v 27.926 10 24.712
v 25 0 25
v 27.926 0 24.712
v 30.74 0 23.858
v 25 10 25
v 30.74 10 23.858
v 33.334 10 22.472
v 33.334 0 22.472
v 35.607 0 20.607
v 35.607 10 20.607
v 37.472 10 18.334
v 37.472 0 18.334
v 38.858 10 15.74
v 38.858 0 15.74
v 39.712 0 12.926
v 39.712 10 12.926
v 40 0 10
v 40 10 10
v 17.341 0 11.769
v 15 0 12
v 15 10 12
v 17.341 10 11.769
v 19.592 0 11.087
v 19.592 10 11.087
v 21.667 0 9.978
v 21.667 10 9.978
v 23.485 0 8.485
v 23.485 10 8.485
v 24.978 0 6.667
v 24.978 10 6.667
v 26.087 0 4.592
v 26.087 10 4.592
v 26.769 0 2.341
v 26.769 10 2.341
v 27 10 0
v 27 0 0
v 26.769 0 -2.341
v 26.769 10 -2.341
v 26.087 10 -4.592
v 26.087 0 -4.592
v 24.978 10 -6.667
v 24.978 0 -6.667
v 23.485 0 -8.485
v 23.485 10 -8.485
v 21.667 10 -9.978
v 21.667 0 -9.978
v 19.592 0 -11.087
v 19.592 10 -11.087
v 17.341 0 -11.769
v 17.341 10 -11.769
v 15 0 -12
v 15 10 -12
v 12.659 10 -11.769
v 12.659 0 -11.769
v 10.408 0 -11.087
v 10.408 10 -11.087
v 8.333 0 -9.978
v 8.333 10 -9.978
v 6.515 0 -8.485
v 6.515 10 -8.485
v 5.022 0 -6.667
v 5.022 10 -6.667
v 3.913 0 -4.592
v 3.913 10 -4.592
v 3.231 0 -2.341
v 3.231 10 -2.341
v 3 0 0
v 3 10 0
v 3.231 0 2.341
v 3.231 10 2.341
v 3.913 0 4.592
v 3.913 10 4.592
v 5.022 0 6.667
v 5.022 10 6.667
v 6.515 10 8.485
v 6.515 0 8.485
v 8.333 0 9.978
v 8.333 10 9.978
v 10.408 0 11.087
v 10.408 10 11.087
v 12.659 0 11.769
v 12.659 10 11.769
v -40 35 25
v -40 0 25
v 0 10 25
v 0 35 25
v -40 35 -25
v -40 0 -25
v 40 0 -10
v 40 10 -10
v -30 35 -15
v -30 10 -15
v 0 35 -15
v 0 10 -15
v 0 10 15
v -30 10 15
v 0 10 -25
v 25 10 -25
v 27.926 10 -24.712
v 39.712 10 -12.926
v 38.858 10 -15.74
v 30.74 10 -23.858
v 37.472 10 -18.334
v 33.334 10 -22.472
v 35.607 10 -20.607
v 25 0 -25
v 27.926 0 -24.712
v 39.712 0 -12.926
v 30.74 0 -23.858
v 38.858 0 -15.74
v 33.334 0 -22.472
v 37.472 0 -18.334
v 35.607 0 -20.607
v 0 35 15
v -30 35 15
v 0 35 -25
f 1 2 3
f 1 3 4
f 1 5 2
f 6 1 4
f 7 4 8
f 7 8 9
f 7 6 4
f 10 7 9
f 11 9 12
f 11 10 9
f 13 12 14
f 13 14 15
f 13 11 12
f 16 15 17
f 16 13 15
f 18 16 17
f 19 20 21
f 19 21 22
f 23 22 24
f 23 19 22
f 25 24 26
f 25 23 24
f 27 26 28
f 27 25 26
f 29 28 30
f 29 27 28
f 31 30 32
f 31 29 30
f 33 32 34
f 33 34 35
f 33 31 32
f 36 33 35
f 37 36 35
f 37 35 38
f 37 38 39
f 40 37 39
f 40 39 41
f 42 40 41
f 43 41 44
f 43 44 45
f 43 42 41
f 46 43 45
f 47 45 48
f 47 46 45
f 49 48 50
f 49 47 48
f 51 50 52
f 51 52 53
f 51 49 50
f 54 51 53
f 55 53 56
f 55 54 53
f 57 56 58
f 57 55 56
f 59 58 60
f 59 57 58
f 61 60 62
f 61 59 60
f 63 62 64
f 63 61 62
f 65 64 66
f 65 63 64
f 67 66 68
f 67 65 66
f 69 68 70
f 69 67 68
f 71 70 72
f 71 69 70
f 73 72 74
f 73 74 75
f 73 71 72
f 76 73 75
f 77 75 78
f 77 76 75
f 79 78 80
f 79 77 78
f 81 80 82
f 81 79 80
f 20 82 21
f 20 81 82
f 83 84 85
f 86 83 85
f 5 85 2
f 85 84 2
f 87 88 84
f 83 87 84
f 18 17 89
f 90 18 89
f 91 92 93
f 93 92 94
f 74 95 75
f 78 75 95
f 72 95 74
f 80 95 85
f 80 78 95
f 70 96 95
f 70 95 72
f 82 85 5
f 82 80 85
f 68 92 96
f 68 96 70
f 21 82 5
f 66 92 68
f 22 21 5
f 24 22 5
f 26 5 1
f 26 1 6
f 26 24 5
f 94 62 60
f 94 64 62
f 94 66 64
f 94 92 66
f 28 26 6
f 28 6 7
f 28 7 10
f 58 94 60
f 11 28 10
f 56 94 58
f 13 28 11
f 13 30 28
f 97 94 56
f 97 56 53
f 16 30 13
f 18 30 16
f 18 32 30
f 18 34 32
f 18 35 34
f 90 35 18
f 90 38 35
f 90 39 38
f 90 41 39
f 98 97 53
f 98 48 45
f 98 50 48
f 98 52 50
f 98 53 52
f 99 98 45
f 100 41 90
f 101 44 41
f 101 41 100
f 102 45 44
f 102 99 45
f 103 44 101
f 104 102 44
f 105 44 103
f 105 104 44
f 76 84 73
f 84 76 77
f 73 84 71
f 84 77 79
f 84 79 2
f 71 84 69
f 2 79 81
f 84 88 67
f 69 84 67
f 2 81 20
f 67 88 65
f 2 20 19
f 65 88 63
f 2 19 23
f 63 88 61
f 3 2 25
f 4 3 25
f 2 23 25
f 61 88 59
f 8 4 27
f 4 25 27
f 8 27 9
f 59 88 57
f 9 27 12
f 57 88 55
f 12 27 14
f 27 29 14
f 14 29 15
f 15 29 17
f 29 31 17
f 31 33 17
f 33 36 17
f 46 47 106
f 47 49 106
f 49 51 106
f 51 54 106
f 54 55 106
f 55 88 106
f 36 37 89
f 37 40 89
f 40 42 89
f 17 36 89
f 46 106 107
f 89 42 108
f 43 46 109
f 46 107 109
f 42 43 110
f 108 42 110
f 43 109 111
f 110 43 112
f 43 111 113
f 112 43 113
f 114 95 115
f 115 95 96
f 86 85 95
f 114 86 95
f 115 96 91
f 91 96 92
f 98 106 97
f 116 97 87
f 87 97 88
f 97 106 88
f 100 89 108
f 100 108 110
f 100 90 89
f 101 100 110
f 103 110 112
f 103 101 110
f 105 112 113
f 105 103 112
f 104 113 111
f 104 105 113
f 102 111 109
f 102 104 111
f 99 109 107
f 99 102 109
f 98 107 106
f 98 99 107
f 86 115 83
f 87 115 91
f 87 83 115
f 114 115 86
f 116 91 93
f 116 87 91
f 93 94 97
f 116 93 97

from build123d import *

# Parameters (mm, degrees)
SKETCH1_R           = 12
BOSS_EXTRUDE1_DEPTH = 10
BOSS_EXTRUDE2_DEPTH = 35
FILLET1_R           = 15


with BuildPart() as part:
    # Sketch1 → Boss-Extrude1 (new body)
    with BuildSketch(Plane(origin=(0, 0, 0), x_dir=(1, 0, 0), z_dir=(0, 1, 0))):
        Polygon((40, 25), (0, 25), (0, 15), (-30, 15), (-30, -15), (0, -15), (0, -25), (40, -25), align=None)
        with Locations((15, 0)):
            Circle(SKETCH1_R, mode=Mode.SUBTRACT)
    extrude(amount=BOSS_EXTRUDE1_DEPTH)

    # Sketch1<3> → Boss-Extrude2 (add)
    with BuildSketch(Plane(origin=(0, 0, 0), x_dir=(1, 0, 0), z_dir=(0, 1, 0))):
        Polygon((0, 15), (0, 25), (-40, 25), (-40, -25), (0, -25), (0, -15), (-30, -15), (-30, 15), align=None)
    extrude(amount=BOSS_EXTRUDE2_DEPTH)

    # Fillet1
    fillet1_edges = [part.edges().sort_by_distance(p)[0] for p in [
        (40, 5, -25),
        (40, 5, 25),
    ]]
    fillet(fillet1_edges, radius=FILLET1_R)


solid = part.part
